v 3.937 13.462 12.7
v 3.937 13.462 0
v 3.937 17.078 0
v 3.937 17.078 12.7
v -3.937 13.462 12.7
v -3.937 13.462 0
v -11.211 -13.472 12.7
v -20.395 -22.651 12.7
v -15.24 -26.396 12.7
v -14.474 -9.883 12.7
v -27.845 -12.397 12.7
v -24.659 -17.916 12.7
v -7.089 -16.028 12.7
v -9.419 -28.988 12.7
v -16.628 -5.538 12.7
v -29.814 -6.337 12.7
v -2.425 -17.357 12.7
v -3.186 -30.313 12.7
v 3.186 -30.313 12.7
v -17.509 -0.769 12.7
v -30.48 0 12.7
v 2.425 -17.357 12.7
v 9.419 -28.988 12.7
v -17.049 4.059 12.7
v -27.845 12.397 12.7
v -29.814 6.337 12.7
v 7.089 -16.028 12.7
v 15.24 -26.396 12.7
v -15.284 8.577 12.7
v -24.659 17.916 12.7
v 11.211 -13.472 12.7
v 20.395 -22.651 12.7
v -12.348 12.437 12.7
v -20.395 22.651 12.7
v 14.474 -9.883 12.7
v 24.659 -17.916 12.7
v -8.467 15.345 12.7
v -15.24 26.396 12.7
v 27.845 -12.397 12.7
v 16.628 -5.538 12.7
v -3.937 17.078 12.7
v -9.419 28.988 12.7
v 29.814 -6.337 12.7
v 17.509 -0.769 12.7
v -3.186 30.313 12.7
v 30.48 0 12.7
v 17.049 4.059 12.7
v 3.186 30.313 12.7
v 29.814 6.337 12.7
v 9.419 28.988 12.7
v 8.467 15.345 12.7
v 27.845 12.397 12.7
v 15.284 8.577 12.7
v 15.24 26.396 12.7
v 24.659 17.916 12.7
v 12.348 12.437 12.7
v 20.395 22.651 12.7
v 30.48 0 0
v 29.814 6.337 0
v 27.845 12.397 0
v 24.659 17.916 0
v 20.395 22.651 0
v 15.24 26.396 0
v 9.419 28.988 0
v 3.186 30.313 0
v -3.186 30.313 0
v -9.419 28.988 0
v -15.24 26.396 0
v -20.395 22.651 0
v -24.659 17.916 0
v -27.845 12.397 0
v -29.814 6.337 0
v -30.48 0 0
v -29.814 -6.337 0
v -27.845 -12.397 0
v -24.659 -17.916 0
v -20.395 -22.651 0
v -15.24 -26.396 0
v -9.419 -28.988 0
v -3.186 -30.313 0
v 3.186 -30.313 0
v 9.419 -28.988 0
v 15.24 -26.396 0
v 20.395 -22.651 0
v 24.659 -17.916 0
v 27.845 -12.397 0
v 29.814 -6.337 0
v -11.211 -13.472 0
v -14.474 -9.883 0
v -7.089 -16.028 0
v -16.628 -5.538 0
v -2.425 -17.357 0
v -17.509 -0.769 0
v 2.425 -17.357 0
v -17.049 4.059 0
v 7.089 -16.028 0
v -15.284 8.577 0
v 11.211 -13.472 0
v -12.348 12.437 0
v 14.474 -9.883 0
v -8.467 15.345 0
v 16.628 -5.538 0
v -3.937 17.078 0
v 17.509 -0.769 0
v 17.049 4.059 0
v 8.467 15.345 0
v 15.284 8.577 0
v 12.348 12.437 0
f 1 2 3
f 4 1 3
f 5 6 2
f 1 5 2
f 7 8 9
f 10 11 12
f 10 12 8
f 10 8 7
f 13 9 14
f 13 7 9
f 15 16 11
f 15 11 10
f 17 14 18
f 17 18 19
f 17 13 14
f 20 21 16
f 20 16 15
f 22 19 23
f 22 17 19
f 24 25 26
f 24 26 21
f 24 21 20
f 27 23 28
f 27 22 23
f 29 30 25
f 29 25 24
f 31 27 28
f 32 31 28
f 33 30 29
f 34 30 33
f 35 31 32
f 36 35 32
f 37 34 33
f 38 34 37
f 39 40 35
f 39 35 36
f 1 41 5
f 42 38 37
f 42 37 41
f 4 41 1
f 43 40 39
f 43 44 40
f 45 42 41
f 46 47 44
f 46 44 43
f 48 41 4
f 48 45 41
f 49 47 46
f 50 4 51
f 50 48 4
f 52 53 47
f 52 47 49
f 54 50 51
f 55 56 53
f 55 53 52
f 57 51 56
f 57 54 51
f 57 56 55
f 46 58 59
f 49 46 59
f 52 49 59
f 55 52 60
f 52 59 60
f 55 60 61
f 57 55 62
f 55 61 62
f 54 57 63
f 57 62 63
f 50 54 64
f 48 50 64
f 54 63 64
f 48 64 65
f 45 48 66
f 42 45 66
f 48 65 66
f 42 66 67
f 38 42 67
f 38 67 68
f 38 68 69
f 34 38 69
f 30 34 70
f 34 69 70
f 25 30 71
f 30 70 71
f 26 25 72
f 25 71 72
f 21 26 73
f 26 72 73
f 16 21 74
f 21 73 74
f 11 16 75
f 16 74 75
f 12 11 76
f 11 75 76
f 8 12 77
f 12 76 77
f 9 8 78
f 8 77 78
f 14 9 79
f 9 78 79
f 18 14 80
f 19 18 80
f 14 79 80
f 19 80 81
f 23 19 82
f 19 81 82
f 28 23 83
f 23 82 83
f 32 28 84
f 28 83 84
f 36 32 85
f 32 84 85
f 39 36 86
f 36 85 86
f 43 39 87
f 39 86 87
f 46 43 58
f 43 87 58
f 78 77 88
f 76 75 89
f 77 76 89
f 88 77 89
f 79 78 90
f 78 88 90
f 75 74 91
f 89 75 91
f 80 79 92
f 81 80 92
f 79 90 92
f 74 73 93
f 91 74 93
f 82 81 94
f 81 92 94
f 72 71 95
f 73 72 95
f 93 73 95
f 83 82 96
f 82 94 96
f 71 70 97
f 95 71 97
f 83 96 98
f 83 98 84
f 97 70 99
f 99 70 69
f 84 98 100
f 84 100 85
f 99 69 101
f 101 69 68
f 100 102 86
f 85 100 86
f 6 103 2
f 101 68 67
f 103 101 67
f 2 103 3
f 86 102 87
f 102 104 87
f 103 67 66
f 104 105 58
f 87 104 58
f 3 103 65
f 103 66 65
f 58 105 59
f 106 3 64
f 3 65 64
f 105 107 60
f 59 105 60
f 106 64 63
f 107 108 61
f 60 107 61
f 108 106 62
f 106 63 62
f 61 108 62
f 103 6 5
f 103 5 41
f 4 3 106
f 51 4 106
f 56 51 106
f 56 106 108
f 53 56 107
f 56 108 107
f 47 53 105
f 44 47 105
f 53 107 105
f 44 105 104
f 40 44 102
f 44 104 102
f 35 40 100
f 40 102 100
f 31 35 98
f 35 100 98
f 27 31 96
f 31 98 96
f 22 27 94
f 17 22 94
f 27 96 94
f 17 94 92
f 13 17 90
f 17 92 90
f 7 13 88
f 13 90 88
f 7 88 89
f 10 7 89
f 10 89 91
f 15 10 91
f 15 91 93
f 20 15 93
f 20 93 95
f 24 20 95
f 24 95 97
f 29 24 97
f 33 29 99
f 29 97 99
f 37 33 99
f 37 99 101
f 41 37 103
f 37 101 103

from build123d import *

# Parameters (mm, degrees)
SKETCH1_R           = 30.48
SKETCH1_W           = 7.874
SKETCH1_H           = 8.128
BOSS_EXTRUDE1_DEPTH = 12.7


with BuildPart() as part:
    # Sketch1 → Boss-Extrude1 (new body)
    # profile 1 of 2: a face of its own
    with BuildSketch(Plane.XY):
        Circle(SKETCH1_R)
        with BuildLine():
            Line((-3.937, 17.078076795), (-3.937, 21.59))
            Line((-3.937, 21.59), (3.937, 21.59))
            Line((3.937, 21.59), (3.937, 17.078076795))
            ThreePointArc((3.937, 17.078076795), (0, -17.526), (-3.937, 17.078076795))
        make_face(mode=Mode.SUBTRACT)
    # profile 2 of 2: a face of its own
    with BuildSketch(Plane.XY):
        with Locations((0, 17.526)):
            Rectangle(SKETCH1_W, SKETCH1_H)
    extrude(amount=BOSS_EXTRUDE1_DEPTH)


solid = part.part
